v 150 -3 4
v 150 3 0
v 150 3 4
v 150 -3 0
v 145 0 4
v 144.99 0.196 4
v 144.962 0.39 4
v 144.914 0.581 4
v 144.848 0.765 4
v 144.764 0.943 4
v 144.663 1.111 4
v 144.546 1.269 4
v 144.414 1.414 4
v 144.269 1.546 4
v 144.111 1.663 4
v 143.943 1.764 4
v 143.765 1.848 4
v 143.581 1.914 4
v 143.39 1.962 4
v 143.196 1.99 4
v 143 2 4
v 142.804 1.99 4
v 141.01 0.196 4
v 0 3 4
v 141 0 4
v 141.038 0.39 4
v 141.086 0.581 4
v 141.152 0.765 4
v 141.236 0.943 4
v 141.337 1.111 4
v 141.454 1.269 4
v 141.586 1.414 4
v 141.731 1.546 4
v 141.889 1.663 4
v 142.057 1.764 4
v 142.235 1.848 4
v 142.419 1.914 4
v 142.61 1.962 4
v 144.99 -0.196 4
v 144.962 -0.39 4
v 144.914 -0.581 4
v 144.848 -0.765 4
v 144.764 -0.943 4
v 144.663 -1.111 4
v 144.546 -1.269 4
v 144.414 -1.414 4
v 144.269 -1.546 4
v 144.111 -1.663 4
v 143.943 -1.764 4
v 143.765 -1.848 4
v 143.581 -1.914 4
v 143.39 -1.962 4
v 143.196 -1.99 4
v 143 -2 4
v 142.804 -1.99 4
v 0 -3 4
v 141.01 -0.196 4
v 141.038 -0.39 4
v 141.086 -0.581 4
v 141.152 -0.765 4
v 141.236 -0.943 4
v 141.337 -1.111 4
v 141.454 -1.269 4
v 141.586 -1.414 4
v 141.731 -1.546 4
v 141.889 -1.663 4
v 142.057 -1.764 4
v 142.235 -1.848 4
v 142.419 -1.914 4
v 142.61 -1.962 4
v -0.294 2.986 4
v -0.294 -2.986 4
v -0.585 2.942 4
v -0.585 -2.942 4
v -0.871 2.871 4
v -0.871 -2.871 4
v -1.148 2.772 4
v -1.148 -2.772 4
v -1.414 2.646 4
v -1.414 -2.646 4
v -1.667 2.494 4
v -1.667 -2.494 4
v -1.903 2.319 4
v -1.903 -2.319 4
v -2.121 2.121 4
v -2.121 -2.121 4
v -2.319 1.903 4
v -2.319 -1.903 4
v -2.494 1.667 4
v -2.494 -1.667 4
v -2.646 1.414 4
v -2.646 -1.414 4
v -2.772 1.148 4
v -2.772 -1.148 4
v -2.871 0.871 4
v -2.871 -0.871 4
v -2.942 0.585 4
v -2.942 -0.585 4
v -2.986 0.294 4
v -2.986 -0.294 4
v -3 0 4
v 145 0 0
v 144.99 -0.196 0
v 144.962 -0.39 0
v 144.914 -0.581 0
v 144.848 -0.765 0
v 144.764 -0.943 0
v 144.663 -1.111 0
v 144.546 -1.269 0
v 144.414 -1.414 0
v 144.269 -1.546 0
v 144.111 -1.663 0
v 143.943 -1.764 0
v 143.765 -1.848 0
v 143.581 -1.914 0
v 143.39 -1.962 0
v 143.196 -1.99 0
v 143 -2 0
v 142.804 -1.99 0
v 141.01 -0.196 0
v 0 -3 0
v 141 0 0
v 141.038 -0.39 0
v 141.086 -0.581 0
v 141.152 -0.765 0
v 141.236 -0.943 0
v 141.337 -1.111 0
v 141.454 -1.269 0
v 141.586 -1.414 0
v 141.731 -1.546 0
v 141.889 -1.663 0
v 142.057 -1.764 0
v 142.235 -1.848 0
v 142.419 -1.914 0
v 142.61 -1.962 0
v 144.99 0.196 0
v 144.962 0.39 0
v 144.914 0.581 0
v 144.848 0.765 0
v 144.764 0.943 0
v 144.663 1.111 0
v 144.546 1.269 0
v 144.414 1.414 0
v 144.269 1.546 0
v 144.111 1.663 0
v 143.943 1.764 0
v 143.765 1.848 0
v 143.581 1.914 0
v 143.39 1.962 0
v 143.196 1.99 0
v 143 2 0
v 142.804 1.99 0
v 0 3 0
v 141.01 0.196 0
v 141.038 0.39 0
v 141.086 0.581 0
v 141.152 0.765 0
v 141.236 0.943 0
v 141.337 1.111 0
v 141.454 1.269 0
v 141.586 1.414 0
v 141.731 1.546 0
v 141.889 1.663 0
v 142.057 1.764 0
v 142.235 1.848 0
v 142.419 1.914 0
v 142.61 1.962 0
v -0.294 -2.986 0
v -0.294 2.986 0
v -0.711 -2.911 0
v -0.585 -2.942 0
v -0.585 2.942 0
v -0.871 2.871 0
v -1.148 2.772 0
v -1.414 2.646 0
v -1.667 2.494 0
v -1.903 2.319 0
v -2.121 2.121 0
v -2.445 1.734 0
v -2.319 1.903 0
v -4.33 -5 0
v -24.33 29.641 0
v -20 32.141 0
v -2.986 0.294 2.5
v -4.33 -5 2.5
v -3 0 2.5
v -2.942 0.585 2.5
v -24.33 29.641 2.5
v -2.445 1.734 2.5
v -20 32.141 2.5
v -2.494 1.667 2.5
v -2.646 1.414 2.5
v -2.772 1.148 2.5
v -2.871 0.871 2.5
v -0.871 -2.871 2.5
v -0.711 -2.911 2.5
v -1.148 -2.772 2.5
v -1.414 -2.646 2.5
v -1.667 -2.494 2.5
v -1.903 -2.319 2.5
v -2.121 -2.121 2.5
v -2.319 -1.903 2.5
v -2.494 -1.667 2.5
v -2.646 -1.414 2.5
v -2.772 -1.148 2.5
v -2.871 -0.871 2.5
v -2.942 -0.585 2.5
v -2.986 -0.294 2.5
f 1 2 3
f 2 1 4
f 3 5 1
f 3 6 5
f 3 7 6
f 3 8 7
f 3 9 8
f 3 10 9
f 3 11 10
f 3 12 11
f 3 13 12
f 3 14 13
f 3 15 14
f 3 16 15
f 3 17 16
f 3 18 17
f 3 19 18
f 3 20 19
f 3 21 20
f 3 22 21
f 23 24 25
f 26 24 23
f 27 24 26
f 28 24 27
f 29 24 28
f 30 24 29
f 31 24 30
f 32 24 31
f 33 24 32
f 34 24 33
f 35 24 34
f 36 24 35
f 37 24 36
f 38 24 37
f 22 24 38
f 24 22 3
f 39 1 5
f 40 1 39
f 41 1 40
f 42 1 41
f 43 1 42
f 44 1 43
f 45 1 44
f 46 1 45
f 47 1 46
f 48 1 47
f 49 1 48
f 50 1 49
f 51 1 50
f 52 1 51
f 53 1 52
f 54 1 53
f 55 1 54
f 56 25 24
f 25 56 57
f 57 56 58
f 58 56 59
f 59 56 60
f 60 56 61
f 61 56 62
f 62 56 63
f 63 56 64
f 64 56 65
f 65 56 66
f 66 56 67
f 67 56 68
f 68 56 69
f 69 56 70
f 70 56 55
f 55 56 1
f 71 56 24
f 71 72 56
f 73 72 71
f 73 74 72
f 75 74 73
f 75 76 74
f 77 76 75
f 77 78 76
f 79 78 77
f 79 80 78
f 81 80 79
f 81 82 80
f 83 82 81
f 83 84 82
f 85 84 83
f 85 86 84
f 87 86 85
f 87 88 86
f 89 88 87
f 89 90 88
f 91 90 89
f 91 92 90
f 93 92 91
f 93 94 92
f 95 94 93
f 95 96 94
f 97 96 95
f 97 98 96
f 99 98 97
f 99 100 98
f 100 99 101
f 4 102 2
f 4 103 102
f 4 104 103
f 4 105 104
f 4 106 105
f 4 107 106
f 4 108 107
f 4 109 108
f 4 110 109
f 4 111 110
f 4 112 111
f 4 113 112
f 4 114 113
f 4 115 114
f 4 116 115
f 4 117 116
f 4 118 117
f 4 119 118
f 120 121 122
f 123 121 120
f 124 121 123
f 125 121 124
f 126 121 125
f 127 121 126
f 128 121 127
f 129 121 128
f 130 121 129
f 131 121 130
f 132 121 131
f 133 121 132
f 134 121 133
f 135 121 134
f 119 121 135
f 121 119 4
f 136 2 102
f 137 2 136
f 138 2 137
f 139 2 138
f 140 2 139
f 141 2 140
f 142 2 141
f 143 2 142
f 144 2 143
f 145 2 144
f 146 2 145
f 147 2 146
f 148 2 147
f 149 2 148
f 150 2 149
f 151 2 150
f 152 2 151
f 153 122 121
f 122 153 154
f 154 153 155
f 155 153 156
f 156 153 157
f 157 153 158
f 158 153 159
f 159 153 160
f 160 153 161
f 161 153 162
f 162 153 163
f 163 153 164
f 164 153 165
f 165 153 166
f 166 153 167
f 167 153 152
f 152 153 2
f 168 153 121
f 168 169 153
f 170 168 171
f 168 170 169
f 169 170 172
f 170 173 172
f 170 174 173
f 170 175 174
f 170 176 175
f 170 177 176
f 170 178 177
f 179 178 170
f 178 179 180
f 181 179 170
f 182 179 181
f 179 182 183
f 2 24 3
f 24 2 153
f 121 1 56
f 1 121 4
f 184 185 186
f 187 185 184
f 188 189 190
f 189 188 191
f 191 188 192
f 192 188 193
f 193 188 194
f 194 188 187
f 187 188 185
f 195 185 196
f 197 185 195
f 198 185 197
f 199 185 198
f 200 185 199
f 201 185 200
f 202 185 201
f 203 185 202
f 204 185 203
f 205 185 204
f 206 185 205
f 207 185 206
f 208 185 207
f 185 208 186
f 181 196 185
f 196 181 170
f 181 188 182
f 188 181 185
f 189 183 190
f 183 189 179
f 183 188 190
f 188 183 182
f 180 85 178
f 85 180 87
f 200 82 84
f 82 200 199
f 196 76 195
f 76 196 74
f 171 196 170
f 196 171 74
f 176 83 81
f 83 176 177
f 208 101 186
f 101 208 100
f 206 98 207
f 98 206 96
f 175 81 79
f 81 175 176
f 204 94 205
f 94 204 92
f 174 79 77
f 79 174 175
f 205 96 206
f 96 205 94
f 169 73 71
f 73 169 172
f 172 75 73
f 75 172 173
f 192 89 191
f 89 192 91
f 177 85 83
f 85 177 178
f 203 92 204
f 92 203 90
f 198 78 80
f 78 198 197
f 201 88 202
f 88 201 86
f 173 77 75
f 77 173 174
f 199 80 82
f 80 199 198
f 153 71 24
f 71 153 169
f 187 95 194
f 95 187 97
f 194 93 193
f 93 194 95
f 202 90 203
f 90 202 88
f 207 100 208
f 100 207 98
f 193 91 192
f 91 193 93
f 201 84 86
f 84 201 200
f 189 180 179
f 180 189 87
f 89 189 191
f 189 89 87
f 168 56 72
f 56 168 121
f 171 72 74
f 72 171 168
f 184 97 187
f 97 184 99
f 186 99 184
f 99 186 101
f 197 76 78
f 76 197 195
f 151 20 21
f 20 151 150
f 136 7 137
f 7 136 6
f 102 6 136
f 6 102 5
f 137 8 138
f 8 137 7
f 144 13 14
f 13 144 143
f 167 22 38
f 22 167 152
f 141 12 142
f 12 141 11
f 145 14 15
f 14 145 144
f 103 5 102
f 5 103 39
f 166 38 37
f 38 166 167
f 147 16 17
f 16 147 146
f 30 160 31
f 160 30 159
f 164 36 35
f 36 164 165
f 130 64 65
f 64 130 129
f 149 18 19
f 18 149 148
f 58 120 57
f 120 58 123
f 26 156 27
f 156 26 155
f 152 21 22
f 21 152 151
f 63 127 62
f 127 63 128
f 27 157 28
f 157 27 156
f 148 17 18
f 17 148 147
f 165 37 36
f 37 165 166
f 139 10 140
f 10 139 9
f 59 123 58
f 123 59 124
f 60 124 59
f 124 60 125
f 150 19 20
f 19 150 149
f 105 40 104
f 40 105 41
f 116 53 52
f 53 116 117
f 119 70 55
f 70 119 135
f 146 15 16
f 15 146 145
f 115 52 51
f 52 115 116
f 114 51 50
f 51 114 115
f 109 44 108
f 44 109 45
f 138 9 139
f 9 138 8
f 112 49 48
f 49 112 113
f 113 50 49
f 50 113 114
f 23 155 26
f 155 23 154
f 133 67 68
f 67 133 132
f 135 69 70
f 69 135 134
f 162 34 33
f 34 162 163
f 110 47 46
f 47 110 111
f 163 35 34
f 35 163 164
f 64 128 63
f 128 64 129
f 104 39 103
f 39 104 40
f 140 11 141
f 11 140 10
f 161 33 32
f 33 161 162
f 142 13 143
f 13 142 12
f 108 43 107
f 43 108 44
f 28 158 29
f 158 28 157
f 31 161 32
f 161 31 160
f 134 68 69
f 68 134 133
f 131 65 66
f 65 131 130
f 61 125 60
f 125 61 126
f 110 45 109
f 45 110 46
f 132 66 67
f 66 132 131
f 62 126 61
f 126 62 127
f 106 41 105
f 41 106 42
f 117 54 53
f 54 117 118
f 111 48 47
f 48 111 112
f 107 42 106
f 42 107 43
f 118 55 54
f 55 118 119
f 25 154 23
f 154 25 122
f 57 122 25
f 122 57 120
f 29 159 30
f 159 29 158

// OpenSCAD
// Handle dimensions (mm)
handle_length = 150;
handle_width = 6;
handle_thickness = 4;

// Spreading foot dimensions (mm)
foot_length = 40;
foot_width = 5;
foot_thickness = 2.5;

// Boss dimensions (mm)
boss_diameter = 6;
boss_height = 4;

// Hole dimensions (mm)
hole_diameter = 4;
hole_x = 143;

// Foot angle (degrees, counter-clockwise from +X axis)
foot_angle = 120;

$fn = 64;

// Main body - union of handle, foot, and boss
difference() {
  union() {
    // Handle: x = 0 to 150, y = -3 to 3, z = 0 to 4
    translate([0, -handle_width/2, 0]) {
      cube([handle_length, handle_width, handle_thickness]);
    }
    
    // Spreading foot: 40 mm long, 5 mm wide, 2.5 mm thick, at 120 degrees
    translate([0, -foot_width/2, 0]) {
      rotate([0, 0, foot_angle]) {
        cube([foot_length, foot_width, foot_thickness]);
      }
    }
    
    // Round boss at origin: 6 mm diameter, 4 mm tall
    cylinder(d=boss_diameter, h=boss_height);
  }
  
  // Subtract hanging hole at x = 143, y = 0
  translate([hole_x, 0, -0.5]) {
    cylinder(d=hole_diameter, h=handle_thickness + 1);
  }
}
